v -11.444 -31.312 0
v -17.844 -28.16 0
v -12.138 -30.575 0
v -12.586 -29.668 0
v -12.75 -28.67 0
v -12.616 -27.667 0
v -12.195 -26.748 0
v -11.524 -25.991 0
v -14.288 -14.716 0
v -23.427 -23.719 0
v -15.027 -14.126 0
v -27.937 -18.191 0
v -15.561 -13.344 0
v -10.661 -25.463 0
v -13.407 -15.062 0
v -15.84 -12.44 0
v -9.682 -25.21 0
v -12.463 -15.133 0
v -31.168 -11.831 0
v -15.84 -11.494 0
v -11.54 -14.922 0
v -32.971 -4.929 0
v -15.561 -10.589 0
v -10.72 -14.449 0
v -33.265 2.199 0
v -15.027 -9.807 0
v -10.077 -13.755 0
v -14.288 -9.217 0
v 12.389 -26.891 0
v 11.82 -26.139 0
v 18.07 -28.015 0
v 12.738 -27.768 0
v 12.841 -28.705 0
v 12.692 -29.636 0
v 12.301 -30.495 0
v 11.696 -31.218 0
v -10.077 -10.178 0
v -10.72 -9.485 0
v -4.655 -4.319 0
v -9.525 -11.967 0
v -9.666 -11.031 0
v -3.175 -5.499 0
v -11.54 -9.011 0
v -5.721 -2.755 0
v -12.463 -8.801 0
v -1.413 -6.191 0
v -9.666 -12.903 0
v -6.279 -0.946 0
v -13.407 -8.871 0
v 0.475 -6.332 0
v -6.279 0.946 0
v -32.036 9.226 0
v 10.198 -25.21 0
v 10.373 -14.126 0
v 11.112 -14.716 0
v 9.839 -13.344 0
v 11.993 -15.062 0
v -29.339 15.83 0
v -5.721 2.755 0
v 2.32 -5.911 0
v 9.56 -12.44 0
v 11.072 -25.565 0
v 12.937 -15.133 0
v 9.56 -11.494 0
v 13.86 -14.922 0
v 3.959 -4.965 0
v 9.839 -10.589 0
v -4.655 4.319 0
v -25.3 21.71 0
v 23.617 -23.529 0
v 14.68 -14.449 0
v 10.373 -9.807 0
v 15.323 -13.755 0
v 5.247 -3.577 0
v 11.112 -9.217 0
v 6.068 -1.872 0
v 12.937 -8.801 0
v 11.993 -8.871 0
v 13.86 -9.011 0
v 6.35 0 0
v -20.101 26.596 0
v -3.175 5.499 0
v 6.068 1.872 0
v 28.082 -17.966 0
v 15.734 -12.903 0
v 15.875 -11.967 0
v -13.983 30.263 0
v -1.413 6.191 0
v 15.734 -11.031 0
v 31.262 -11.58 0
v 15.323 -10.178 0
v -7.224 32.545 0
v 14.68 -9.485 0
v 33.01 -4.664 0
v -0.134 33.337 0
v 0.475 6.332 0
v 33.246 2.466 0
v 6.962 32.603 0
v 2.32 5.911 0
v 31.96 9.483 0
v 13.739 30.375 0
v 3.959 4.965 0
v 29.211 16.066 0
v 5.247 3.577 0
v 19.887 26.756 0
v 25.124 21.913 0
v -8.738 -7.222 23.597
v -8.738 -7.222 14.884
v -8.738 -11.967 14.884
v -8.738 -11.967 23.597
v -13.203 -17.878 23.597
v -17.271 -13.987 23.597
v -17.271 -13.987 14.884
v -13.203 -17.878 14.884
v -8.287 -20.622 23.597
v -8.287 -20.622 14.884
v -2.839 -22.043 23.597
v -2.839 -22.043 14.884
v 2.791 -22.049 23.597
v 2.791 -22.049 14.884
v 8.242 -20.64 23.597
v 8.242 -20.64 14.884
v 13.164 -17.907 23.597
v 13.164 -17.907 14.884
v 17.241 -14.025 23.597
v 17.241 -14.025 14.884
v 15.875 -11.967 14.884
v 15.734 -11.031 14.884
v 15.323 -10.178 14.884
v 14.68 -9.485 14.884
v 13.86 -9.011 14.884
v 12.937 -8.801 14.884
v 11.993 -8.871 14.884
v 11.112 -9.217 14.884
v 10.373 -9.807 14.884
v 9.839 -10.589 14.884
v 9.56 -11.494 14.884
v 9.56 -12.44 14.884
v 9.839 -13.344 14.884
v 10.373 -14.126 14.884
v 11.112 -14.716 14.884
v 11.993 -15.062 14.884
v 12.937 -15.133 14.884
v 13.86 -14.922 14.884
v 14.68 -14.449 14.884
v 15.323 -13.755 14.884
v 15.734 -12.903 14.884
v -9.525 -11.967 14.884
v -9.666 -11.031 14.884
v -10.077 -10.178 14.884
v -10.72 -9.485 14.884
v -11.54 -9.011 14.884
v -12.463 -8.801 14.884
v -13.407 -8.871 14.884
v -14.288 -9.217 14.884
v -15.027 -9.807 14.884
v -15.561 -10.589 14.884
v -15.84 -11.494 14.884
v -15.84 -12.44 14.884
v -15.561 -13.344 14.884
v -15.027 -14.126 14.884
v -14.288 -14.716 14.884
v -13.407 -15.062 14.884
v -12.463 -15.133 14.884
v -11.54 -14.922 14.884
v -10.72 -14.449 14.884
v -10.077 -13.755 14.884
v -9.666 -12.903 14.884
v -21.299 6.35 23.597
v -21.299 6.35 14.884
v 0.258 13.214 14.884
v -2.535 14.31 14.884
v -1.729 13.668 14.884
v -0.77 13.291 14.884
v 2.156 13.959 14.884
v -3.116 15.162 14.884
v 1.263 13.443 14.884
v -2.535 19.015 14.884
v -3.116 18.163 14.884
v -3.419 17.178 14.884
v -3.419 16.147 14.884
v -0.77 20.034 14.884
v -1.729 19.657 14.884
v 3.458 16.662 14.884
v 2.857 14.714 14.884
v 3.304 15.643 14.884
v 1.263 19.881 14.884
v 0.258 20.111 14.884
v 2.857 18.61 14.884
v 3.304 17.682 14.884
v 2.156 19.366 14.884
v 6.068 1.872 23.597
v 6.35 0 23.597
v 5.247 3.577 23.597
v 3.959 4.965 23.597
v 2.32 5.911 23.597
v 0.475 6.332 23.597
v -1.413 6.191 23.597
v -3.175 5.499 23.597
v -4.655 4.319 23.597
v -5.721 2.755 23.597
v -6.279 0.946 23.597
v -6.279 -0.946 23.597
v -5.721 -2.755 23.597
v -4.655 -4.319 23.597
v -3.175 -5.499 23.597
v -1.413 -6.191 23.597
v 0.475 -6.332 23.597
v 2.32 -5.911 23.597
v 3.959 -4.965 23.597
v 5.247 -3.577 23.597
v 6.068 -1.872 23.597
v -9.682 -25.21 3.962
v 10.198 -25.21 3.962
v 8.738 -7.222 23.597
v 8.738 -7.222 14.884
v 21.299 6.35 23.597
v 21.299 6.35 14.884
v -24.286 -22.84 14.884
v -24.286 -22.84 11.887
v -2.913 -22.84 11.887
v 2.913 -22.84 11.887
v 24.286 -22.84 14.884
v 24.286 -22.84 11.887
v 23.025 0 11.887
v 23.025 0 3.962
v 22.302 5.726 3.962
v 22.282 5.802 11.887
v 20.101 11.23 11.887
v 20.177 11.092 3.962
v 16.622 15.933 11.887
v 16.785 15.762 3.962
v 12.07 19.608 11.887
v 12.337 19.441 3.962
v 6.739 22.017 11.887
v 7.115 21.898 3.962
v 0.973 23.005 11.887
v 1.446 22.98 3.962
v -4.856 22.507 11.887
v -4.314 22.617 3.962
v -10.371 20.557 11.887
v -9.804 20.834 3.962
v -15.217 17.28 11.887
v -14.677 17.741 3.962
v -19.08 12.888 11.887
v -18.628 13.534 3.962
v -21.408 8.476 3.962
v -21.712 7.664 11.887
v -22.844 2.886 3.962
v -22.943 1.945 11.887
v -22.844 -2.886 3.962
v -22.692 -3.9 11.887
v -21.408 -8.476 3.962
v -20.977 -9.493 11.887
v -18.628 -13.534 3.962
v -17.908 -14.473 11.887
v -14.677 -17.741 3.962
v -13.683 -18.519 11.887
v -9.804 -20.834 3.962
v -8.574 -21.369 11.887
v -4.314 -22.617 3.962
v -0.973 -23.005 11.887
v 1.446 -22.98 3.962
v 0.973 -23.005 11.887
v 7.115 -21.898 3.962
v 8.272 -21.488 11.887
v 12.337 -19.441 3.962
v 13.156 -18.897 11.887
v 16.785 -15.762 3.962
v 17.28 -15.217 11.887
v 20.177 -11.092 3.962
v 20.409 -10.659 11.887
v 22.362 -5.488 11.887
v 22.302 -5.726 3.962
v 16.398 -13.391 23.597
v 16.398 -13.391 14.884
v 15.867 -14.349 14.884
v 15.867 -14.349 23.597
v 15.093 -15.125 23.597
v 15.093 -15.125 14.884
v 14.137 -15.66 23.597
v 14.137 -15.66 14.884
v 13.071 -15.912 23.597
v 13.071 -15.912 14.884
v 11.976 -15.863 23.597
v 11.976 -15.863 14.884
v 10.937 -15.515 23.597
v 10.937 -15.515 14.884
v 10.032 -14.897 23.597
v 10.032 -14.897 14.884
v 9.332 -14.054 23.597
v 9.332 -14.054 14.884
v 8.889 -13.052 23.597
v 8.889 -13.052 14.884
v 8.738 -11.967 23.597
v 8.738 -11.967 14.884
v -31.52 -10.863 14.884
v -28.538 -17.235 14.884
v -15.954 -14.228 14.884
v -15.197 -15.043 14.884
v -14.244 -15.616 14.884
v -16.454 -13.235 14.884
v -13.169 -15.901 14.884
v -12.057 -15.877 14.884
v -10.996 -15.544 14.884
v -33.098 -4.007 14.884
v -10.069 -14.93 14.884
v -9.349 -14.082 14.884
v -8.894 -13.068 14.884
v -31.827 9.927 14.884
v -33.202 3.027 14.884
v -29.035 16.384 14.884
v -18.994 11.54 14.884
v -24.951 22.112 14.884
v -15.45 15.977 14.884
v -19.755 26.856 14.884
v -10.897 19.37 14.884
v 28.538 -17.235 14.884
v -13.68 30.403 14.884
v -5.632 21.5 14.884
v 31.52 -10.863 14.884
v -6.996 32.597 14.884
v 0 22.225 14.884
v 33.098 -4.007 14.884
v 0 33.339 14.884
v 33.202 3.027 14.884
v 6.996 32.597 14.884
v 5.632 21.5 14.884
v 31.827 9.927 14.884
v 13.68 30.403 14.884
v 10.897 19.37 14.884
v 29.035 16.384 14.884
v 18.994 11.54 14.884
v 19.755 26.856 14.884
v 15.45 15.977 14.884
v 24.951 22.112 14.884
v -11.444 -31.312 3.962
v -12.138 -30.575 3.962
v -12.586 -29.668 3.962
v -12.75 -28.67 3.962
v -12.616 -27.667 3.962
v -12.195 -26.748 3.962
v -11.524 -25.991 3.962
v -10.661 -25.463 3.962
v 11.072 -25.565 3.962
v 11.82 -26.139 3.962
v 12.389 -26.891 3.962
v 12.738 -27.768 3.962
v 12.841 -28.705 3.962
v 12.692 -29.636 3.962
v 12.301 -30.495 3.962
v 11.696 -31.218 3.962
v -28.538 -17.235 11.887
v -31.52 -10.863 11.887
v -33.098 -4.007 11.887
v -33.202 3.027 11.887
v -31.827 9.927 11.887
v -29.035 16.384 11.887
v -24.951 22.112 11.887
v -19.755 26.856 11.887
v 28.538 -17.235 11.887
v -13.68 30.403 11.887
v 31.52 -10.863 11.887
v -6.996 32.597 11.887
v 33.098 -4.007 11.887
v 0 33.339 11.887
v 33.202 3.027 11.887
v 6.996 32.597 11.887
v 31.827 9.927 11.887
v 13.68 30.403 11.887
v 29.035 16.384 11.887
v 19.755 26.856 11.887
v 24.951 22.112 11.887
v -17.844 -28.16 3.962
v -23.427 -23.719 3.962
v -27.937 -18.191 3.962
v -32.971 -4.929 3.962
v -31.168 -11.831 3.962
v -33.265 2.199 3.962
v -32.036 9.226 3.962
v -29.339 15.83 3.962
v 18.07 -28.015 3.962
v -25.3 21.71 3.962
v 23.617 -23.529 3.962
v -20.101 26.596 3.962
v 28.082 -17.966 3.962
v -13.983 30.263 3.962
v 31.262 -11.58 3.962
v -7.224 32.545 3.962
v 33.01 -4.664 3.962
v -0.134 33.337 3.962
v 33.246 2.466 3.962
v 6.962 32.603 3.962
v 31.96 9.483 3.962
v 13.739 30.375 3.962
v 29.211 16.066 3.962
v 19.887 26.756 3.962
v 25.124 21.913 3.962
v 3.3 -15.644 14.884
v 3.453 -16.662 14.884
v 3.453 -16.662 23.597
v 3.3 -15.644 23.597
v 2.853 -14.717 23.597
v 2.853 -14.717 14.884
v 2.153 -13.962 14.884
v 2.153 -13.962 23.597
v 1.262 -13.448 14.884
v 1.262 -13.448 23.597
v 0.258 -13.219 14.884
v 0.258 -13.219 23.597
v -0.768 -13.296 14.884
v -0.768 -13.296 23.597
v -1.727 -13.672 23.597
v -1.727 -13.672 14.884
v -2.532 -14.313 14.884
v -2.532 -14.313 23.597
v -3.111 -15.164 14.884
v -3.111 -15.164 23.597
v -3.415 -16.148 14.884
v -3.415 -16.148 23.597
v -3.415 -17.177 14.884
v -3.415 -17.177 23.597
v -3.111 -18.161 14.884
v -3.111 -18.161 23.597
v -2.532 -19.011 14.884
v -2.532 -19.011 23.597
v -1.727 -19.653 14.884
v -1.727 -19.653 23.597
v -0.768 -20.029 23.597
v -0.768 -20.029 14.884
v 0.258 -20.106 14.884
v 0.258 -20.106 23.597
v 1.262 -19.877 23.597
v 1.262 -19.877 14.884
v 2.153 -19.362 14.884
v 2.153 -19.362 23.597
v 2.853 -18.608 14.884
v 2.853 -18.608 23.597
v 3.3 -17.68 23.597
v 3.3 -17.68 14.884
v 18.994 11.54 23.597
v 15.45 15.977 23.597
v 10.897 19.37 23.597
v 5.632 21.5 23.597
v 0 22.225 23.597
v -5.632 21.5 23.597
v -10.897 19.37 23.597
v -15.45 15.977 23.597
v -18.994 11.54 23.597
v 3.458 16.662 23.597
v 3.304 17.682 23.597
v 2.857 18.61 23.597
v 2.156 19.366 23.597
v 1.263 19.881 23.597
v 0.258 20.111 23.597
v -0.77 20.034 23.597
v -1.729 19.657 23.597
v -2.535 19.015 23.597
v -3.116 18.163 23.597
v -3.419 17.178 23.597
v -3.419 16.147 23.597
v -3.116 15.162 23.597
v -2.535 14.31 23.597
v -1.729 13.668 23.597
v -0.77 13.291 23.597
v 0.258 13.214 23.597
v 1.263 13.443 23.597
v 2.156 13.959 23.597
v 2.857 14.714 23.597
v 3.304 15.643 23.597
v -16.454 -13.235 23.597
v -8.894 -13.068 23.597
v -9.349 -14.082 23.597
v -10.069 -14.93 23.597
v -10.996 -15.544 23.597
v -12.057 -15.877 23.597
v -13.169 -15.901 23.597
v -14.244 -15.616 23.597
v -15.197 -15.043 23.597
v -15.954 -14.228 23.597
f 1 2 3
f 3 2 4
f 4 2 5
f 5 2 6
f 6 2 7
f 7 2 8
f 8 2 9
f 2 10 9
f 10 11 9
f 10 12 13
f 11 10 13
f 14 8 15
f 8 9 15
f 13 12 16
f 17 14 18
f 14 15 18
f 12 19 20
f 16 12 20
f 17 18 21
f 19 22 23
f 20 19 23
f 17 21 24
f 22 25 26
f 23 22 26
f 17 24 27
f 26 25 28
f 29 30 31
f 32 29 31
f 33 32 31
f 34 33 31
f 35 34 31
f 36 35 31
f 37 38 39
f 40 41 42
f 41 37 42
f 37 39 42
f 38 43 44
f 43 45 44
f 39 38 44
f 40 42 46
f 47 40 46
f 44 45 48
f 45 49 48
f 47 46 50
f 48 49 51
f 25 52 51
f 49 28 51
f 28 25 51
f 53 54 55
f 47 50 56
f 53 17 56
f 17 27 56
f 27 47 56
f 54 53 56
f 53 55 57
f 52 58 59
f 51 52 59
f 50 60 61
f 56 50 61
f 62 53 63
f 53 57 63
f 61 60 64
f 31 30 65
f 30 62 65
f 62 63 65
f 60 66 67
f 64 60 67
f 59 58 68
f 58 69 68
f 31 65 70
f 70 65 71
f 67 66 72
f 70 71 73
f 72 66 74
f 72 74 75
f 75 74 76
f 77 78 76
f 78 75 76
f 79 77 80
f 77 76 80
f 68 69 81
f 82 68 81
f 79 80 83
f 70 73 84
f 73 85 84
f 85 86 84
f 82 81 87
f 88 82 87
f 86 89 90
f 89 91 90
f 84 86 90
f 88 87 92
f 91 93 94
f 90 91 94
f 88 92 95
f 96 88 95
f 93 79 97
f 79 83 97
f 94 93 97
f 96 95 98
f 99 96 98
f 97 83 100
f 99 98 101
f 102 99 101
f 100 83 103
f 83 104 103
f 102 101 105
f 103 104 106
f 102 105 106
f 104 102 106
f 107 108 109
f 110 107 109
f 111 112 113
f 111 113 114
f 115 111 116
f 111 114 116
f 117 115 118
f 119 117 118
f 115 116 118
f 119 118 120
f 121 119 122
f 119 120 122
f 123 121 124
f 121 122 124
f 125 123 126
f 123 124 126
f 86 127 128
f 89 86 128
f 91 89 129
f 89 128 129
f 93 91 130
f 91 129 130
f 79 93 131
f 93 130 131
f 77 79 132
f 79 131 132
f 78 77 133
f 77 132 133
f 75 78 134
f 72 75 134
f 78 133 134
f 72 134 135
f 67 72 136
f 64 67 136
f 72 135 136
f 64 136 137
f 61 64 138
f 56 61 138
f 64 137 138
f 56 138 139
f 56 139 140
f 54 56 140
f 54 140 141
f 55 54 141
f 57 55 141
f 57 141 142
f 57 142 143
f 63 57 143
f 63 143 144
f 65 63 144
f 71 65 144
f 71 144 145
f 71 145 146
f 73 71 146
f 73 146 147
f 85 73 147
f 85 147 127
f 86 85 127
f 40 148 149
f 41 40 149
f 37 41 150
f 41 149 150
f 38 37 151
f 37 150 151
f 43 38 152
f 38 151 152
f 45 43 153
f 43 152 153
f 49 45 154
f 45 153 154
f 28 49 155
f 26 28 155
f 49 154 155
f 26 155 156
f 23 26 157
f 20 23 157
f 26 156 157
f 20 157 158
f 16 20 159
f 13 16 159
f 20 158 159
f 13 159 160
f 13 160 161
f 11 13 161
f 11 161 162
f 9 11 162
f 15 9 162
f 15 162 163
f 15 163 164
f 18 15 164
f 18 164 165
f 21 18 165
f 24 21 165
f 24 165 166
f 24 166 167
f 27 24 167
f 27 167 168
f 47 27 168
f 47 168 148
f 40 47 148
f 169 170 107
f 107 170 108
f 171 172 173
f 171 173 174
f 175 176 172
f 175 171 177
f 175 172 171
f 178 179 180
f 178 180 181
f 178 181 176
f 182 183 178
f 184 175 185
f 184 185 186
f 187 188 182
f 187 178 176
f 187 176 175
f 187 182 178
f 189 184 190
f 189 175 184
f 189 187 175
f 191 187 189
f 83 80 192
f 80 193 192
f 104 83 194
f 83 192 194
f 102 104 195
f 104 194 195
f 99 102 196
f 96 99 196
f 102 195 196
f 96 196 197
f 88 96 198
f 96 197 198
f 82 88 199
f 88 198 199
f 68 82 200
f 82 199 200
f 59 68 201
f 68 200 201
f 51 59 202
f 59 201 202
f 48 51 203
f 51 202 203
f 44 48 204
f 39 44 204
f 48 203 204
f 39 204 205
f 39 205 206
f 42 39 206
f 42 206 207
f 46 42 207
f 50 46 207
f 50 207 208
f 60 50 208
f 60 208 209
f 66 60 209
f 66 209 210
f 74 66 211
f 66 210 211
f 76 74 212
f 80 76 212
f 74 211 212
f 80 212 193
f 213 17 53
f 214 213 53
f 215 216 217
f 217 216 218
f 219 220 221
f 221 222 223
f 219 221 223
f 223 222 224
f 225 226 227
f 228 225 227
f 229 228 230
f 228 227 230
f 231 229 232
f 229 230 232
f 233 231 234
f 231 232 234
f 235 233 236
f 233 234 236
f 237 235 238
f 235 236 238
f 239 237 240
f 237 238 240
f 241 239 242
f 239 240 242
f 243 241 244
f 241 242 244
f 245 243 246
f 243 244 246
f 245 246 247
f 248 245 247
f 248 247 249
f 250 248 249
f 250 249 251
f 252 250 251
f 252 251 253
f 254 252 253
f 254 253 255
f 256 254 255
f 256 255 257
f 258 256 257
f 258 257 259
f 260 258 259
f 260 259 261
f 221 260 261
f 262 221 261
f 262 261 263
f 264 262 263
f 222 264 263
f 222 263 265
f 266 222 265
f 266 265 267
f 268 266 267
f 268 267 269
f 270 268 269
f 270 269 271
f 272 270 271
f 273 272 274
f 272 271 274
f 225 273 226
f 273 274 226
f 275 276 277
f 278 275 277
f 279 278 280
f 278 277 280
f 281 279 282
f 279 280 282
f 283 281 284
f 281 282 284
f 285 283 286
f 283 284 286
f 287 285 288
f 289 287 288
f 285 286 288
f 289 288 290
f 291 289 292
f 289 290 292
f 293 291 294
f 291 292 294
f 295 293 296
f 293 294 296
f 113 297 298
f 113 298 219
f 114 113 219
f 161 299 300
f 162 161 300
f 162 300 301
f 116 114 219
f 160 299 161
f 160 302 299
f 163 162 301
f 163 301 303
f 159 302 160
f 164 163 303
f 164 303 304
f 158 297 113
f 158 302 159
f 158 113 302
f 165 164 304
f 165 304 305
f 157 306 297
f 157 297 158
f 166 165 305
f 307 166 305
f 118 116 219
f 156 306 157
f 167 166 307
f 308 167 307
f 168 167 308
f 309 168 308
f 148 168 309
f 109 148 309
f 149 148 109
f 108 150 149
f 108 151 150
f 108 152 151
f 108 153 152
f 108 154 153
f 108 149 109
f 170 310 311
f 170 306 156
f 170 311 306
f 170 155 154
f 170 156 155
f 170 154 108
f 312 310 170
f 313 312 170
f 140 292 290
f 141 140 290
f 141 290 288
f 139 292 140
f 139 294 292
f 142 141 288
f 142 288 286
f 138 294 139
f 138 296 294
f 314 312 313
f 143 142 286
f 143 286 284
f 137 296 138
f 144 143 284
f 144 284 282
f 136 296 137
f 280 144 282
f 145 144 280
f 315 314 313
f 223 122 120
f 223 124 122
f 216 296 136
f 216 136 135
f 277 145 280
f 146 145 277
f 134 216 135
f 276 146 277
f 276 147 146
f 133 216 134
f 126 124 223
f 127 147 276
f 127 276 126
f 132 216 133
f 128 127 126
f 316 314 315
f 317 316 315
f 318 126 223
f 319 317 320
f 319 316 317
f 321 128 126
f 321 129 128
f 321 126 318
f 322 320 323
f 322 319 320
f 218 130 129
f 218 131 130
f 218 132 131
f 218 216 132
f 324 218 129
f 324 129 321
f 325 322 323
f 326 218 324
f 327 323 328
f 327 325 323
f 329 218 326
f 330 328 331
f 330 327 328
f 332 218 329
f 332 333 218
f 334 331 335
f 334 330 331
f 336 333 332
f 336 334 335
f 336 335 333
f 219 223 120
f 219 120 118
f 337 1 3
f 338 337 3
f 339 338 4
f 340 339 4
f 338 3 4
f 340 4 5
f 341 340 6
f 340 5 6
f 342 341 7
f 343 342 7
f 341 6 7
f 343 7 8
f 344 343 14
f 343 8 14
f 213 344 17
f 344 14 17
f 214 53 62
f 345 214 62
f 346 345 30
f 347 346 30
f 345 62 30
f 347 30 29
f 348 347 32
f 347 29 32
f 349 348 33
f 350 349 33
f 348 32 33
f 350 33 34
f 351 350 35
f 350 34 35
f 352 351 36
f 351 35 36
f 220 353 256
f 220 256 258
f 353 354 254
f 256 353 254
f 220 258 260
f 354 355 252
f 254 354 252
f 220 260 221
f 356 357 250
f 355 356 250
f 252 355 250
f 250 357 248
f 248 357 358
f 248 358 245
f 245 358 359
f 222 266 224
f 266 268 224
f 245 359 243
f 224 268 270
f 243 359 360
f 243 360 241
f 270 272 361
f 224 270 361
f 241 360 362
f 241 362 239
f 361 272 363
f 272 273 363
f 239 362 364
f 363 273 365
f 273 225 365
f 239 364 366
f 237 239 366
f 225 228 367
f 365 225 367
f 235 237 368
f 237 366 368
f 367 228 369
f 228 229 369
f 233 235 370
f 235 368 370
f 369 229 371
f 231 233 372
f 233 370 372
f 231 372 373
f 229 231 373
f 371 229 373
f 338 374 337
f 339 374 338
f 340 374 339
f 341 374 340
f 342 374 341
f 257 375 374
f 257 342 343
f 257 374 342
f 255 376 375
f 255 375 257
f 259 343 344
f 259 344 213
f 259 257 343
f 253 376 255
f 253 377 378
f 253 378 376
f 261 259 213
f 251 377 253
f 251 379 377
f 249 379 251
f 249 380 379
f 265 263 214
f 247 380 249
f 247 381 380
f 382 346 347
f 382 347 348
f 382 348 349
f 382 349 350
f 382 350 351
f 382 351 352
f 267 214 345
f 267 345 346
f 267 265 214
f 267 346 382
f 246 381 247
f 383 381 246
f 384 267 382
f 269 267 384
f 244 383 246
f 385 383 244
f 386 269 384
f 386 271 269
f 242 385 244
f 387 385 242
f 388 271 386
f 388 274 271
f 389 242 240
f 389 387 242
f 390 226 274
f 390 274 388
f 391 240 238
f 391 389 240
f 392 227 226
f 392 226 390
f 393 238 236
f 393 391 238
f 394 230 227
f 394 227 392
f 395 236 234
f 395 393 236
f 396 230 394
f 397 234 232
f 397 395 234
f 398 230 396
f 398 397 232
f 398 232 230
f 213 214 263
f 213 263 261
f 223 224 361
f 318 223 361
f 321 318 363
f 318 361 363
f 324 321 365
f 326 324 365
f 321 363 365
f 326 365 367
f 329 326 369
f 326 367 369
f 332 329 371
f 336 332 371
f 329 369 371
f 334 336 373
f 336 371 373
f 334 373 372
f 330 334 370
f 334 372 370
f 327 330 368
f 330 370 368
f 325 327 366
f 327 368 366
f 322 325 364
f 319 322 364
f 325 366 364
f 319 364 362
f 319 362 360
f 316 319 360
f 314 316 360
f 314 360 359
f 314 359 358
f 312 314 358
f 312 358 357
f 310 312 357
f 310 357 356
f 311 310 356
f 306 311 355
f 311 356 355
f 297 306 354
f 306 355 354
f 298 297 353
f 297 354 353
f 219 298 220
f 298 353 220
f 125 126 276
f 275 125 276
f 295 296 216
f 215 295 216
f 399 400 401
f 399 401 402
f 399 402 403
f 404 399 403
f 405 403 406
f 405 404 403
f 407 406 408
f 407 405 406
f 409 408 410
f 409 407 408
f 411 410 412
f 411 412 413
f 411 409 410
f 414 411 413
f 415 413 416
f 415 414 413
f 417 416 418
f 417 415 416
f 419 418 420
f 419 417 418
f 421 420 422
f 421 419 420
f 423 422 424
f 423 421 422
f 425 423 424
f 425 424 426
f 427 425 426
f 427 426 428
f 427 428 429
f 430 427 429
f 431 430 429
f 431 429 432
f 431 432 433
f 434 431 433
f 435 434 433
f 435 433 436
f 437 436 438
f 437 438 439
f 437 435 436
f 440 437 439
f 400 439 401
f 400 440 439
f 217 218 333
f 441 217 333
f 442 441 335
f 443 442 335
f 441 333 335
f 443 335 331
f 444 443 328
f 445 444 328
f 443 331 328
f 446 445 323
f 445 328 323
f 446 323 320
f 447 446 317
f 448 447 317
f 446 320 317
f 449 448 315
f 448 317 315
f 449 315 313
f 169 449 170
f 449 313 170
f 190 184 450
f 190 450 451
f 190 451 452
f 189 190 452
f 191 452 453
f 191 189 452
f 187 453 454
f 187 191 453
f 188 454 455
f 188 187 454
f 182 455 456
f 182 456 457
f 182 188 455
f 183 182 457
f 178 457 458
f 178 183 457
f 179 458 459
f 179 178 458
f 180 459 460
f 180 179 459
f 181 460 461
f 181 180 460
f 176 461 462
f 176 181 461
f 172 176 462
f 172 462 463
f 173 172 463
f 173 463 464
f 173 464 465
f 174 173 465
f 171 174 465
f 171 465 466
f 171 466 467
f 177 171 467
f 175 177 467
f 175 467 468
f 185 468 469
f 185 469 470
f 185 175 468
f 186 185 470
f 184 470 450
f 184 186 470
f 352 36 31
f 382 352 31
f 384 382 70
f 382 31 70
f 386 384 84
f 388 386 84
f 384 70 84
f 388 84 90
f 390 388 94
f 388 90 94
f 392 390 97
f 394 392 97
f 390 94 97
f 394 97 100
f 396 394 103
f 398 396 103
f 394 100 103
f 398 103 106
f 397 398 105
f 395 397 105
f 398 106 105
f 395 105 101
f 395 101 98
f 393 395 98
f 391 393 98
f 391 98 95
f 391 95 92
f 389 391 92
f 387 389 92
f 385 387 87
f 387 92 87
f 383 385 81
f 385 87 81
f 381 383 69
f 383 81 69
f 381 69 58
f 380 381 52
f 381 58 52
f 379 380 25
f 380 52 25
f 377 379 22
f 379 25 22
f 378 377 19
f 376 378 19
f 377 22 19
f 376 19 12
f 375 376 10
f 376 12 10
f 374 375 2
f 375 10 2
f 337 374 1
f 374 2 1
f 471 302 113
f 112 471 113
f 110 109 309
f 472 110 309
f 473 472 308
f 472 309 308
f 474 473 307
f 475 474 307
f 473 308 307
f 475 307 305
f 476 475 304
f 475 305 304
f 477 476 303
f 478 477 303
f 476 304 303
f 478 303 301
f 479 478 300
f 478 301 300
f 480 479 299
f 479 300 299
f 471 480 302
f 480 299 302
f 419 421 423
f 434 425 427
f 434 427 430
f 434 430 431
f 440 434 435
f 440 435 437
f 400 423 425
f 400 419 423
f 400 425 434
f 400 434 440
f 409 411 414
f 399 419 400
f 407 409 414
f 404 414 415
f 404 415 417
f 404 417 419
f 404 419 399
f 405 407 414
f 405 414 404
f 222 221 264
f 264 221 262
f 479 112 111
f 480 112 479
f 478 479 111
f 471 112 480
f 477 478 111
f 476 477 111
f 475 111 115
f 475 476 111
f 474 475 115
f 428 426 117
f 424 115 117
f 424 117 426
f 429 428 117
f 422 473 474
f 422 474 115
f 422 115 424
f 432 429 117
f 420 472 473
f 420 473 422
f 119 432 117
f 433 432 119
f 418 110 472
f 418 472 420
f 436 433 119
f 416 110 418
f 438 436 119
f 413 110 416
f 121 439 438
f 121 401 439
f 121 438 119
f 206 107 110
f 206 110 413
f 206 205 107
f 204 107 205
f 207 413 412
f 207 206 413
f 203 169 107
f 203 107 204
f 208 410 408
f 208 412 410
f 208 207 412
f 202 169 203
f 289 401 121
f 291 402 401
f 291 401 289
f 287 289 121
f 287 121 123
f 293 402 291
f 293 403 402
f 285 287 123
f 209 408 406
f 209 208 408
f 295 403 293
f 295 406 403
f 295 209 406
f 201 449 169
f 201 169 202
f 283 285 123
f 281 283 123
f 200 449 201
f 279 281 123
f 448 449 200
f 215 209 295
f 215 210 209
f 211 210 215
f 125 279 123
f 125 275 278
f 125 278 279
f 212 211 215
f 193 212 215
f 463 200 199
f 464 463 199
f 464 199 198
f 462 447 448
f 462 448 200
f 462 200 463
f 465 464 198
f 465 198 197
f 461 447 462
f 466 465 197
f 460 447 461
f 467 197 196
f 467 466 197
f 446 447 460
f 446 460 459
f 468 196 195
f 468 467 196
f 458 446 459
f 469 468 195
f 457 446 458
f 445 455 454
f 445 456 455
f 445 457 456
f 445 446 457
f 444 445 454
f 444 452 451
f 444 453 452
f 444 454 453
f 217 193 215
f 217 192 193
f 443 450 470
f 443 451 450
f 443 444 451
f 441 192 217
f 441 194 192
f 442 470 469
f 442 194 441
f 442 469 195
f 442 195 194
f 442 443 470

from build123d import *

# Parameters (mm, degrees)
F1_DEPTH  = 3.9624
F2_R      = 23.0251
F3_DEPTH  = 7.9248
F5_DEPTH  = 2.9972
F6_R      = 6.35
F6_R_2    = 3.453465
F6_R_3    = 3.458119
F7_DEPTH  = 8.7122
F8_R      = 6.35
F9_DEPTH  = 23.5976
F10_R     = 3.175
F11_DEPTH = 14.8854


with BuildPart() as f1:
    # F0 (on Top) → F1 (new body)
    with BuildSketch(Plane.XY):
        with BuildLine():
            Line((-8.962085, -25.2095), (0, -25.2095))
            Line((0, -25.2095), (10.198205, -25.2095))
            ThreePointArc((10.198205, -25.2095), (12.737725, -27.767632), (11.69605, -31.218445))
            ThreePointArc((11.69605, -31.218445), (-0.134135, 33.33723), (-11.444457, -31.311552))
            ThreePointArc((-11.444457, -31.311552), (-12.615628, -27.667498), (-9.681515, -25.2095))
            Line((-9.681515, -25.2095), (-8.962085, -25.2095))
        make_face()
    extrude(amount=F1_DEPTH)

    # F2 (on face) → F3 (join)
    with BuildSketch(Plane.XY.offset(3.9624)):
        Circle(F2_R)
    extrude(amount=F3_DEPTH)

    # F4 (on face) → F5 (join)
    with BuildSketch(Plane.XY.offset(11.8872)):
        with BuildLine():
            Line((-24.286461, -22.84014), (24.286461, -22.84014))
            ThreePointArc((24.286461, -22.84014), (0, 33.339229), (-24.286461, -22.84014))
        make_face()
    extrude(amount=F5_DEPTH)

    # F6 (on face) → F7 (join)
    with BuildSketch(Plane.XY.offset(14.8844)):
        Circle(F6_R)
        with BuildLine():
            Line((8.7376, -7.221702), (21.298547, 6.35))
            ThreePointArc((21.298547, 6.35), (0, 22.225), (-21.298547, 6.35))
            Line((-21.298547, 6.35), (-8.7376, -7.221702))
            Line((-8.7376, -7.221702), (-8.7376, -11.966851))
            ThreePointArc((-8.7376, -11.966851), (-12.057279, -15.876777), (-16.453895, -13.23527))
            Line((-16.453895, -13.23527), (-17.271447, -13.987414))
            ThreePointArc((-17.271447, -13.987414), (-0.024306, -22.224987), (17.240811, -14.025158))
            Line((17.240811, -14.025158), (16.397809, -13.390516))
            ThreePointArc((16.397809, -13.390516), (11.975978, -15.862542), (8.7376, -11.966851))
            Line((8.7376, -11.966851), (8.7376, -7.221702))
        make_face()
        with Locations((0, -16.6624)):
            Circle(F6_R_2, mode=Mode.SUBTRACT)
        Circle(F6_R, mode=Mode.SUBTRACT)
        with Locations((0, 16.6624)):
            Circle(F6_R_3, mode=Mode.SUBTRACT)
    extrude(amount=F7_DEPTH)

    # F8 (on face) → F9 (cut, through all)
    with BuildSketch(Plane.XY.offset(23.5966)):
        Circle(F8_R)
    extrude(amount=-F9_DEPTH, mode=Mode.SUBTRACT)

    # F10 (on face) → F11 (cut, through all)
    with BuildSketch(Plane.XY.offset(14.8844)):
        with Locations((-12.7, -11.966851)):
            Circle(F10_R)
        with Locations((12.7, -11.966851)):
            Circle(F10_R)
    extrude(amount=-F11_DEPTH, mode=Mode.SUBTRACT)


solid = f1.part
